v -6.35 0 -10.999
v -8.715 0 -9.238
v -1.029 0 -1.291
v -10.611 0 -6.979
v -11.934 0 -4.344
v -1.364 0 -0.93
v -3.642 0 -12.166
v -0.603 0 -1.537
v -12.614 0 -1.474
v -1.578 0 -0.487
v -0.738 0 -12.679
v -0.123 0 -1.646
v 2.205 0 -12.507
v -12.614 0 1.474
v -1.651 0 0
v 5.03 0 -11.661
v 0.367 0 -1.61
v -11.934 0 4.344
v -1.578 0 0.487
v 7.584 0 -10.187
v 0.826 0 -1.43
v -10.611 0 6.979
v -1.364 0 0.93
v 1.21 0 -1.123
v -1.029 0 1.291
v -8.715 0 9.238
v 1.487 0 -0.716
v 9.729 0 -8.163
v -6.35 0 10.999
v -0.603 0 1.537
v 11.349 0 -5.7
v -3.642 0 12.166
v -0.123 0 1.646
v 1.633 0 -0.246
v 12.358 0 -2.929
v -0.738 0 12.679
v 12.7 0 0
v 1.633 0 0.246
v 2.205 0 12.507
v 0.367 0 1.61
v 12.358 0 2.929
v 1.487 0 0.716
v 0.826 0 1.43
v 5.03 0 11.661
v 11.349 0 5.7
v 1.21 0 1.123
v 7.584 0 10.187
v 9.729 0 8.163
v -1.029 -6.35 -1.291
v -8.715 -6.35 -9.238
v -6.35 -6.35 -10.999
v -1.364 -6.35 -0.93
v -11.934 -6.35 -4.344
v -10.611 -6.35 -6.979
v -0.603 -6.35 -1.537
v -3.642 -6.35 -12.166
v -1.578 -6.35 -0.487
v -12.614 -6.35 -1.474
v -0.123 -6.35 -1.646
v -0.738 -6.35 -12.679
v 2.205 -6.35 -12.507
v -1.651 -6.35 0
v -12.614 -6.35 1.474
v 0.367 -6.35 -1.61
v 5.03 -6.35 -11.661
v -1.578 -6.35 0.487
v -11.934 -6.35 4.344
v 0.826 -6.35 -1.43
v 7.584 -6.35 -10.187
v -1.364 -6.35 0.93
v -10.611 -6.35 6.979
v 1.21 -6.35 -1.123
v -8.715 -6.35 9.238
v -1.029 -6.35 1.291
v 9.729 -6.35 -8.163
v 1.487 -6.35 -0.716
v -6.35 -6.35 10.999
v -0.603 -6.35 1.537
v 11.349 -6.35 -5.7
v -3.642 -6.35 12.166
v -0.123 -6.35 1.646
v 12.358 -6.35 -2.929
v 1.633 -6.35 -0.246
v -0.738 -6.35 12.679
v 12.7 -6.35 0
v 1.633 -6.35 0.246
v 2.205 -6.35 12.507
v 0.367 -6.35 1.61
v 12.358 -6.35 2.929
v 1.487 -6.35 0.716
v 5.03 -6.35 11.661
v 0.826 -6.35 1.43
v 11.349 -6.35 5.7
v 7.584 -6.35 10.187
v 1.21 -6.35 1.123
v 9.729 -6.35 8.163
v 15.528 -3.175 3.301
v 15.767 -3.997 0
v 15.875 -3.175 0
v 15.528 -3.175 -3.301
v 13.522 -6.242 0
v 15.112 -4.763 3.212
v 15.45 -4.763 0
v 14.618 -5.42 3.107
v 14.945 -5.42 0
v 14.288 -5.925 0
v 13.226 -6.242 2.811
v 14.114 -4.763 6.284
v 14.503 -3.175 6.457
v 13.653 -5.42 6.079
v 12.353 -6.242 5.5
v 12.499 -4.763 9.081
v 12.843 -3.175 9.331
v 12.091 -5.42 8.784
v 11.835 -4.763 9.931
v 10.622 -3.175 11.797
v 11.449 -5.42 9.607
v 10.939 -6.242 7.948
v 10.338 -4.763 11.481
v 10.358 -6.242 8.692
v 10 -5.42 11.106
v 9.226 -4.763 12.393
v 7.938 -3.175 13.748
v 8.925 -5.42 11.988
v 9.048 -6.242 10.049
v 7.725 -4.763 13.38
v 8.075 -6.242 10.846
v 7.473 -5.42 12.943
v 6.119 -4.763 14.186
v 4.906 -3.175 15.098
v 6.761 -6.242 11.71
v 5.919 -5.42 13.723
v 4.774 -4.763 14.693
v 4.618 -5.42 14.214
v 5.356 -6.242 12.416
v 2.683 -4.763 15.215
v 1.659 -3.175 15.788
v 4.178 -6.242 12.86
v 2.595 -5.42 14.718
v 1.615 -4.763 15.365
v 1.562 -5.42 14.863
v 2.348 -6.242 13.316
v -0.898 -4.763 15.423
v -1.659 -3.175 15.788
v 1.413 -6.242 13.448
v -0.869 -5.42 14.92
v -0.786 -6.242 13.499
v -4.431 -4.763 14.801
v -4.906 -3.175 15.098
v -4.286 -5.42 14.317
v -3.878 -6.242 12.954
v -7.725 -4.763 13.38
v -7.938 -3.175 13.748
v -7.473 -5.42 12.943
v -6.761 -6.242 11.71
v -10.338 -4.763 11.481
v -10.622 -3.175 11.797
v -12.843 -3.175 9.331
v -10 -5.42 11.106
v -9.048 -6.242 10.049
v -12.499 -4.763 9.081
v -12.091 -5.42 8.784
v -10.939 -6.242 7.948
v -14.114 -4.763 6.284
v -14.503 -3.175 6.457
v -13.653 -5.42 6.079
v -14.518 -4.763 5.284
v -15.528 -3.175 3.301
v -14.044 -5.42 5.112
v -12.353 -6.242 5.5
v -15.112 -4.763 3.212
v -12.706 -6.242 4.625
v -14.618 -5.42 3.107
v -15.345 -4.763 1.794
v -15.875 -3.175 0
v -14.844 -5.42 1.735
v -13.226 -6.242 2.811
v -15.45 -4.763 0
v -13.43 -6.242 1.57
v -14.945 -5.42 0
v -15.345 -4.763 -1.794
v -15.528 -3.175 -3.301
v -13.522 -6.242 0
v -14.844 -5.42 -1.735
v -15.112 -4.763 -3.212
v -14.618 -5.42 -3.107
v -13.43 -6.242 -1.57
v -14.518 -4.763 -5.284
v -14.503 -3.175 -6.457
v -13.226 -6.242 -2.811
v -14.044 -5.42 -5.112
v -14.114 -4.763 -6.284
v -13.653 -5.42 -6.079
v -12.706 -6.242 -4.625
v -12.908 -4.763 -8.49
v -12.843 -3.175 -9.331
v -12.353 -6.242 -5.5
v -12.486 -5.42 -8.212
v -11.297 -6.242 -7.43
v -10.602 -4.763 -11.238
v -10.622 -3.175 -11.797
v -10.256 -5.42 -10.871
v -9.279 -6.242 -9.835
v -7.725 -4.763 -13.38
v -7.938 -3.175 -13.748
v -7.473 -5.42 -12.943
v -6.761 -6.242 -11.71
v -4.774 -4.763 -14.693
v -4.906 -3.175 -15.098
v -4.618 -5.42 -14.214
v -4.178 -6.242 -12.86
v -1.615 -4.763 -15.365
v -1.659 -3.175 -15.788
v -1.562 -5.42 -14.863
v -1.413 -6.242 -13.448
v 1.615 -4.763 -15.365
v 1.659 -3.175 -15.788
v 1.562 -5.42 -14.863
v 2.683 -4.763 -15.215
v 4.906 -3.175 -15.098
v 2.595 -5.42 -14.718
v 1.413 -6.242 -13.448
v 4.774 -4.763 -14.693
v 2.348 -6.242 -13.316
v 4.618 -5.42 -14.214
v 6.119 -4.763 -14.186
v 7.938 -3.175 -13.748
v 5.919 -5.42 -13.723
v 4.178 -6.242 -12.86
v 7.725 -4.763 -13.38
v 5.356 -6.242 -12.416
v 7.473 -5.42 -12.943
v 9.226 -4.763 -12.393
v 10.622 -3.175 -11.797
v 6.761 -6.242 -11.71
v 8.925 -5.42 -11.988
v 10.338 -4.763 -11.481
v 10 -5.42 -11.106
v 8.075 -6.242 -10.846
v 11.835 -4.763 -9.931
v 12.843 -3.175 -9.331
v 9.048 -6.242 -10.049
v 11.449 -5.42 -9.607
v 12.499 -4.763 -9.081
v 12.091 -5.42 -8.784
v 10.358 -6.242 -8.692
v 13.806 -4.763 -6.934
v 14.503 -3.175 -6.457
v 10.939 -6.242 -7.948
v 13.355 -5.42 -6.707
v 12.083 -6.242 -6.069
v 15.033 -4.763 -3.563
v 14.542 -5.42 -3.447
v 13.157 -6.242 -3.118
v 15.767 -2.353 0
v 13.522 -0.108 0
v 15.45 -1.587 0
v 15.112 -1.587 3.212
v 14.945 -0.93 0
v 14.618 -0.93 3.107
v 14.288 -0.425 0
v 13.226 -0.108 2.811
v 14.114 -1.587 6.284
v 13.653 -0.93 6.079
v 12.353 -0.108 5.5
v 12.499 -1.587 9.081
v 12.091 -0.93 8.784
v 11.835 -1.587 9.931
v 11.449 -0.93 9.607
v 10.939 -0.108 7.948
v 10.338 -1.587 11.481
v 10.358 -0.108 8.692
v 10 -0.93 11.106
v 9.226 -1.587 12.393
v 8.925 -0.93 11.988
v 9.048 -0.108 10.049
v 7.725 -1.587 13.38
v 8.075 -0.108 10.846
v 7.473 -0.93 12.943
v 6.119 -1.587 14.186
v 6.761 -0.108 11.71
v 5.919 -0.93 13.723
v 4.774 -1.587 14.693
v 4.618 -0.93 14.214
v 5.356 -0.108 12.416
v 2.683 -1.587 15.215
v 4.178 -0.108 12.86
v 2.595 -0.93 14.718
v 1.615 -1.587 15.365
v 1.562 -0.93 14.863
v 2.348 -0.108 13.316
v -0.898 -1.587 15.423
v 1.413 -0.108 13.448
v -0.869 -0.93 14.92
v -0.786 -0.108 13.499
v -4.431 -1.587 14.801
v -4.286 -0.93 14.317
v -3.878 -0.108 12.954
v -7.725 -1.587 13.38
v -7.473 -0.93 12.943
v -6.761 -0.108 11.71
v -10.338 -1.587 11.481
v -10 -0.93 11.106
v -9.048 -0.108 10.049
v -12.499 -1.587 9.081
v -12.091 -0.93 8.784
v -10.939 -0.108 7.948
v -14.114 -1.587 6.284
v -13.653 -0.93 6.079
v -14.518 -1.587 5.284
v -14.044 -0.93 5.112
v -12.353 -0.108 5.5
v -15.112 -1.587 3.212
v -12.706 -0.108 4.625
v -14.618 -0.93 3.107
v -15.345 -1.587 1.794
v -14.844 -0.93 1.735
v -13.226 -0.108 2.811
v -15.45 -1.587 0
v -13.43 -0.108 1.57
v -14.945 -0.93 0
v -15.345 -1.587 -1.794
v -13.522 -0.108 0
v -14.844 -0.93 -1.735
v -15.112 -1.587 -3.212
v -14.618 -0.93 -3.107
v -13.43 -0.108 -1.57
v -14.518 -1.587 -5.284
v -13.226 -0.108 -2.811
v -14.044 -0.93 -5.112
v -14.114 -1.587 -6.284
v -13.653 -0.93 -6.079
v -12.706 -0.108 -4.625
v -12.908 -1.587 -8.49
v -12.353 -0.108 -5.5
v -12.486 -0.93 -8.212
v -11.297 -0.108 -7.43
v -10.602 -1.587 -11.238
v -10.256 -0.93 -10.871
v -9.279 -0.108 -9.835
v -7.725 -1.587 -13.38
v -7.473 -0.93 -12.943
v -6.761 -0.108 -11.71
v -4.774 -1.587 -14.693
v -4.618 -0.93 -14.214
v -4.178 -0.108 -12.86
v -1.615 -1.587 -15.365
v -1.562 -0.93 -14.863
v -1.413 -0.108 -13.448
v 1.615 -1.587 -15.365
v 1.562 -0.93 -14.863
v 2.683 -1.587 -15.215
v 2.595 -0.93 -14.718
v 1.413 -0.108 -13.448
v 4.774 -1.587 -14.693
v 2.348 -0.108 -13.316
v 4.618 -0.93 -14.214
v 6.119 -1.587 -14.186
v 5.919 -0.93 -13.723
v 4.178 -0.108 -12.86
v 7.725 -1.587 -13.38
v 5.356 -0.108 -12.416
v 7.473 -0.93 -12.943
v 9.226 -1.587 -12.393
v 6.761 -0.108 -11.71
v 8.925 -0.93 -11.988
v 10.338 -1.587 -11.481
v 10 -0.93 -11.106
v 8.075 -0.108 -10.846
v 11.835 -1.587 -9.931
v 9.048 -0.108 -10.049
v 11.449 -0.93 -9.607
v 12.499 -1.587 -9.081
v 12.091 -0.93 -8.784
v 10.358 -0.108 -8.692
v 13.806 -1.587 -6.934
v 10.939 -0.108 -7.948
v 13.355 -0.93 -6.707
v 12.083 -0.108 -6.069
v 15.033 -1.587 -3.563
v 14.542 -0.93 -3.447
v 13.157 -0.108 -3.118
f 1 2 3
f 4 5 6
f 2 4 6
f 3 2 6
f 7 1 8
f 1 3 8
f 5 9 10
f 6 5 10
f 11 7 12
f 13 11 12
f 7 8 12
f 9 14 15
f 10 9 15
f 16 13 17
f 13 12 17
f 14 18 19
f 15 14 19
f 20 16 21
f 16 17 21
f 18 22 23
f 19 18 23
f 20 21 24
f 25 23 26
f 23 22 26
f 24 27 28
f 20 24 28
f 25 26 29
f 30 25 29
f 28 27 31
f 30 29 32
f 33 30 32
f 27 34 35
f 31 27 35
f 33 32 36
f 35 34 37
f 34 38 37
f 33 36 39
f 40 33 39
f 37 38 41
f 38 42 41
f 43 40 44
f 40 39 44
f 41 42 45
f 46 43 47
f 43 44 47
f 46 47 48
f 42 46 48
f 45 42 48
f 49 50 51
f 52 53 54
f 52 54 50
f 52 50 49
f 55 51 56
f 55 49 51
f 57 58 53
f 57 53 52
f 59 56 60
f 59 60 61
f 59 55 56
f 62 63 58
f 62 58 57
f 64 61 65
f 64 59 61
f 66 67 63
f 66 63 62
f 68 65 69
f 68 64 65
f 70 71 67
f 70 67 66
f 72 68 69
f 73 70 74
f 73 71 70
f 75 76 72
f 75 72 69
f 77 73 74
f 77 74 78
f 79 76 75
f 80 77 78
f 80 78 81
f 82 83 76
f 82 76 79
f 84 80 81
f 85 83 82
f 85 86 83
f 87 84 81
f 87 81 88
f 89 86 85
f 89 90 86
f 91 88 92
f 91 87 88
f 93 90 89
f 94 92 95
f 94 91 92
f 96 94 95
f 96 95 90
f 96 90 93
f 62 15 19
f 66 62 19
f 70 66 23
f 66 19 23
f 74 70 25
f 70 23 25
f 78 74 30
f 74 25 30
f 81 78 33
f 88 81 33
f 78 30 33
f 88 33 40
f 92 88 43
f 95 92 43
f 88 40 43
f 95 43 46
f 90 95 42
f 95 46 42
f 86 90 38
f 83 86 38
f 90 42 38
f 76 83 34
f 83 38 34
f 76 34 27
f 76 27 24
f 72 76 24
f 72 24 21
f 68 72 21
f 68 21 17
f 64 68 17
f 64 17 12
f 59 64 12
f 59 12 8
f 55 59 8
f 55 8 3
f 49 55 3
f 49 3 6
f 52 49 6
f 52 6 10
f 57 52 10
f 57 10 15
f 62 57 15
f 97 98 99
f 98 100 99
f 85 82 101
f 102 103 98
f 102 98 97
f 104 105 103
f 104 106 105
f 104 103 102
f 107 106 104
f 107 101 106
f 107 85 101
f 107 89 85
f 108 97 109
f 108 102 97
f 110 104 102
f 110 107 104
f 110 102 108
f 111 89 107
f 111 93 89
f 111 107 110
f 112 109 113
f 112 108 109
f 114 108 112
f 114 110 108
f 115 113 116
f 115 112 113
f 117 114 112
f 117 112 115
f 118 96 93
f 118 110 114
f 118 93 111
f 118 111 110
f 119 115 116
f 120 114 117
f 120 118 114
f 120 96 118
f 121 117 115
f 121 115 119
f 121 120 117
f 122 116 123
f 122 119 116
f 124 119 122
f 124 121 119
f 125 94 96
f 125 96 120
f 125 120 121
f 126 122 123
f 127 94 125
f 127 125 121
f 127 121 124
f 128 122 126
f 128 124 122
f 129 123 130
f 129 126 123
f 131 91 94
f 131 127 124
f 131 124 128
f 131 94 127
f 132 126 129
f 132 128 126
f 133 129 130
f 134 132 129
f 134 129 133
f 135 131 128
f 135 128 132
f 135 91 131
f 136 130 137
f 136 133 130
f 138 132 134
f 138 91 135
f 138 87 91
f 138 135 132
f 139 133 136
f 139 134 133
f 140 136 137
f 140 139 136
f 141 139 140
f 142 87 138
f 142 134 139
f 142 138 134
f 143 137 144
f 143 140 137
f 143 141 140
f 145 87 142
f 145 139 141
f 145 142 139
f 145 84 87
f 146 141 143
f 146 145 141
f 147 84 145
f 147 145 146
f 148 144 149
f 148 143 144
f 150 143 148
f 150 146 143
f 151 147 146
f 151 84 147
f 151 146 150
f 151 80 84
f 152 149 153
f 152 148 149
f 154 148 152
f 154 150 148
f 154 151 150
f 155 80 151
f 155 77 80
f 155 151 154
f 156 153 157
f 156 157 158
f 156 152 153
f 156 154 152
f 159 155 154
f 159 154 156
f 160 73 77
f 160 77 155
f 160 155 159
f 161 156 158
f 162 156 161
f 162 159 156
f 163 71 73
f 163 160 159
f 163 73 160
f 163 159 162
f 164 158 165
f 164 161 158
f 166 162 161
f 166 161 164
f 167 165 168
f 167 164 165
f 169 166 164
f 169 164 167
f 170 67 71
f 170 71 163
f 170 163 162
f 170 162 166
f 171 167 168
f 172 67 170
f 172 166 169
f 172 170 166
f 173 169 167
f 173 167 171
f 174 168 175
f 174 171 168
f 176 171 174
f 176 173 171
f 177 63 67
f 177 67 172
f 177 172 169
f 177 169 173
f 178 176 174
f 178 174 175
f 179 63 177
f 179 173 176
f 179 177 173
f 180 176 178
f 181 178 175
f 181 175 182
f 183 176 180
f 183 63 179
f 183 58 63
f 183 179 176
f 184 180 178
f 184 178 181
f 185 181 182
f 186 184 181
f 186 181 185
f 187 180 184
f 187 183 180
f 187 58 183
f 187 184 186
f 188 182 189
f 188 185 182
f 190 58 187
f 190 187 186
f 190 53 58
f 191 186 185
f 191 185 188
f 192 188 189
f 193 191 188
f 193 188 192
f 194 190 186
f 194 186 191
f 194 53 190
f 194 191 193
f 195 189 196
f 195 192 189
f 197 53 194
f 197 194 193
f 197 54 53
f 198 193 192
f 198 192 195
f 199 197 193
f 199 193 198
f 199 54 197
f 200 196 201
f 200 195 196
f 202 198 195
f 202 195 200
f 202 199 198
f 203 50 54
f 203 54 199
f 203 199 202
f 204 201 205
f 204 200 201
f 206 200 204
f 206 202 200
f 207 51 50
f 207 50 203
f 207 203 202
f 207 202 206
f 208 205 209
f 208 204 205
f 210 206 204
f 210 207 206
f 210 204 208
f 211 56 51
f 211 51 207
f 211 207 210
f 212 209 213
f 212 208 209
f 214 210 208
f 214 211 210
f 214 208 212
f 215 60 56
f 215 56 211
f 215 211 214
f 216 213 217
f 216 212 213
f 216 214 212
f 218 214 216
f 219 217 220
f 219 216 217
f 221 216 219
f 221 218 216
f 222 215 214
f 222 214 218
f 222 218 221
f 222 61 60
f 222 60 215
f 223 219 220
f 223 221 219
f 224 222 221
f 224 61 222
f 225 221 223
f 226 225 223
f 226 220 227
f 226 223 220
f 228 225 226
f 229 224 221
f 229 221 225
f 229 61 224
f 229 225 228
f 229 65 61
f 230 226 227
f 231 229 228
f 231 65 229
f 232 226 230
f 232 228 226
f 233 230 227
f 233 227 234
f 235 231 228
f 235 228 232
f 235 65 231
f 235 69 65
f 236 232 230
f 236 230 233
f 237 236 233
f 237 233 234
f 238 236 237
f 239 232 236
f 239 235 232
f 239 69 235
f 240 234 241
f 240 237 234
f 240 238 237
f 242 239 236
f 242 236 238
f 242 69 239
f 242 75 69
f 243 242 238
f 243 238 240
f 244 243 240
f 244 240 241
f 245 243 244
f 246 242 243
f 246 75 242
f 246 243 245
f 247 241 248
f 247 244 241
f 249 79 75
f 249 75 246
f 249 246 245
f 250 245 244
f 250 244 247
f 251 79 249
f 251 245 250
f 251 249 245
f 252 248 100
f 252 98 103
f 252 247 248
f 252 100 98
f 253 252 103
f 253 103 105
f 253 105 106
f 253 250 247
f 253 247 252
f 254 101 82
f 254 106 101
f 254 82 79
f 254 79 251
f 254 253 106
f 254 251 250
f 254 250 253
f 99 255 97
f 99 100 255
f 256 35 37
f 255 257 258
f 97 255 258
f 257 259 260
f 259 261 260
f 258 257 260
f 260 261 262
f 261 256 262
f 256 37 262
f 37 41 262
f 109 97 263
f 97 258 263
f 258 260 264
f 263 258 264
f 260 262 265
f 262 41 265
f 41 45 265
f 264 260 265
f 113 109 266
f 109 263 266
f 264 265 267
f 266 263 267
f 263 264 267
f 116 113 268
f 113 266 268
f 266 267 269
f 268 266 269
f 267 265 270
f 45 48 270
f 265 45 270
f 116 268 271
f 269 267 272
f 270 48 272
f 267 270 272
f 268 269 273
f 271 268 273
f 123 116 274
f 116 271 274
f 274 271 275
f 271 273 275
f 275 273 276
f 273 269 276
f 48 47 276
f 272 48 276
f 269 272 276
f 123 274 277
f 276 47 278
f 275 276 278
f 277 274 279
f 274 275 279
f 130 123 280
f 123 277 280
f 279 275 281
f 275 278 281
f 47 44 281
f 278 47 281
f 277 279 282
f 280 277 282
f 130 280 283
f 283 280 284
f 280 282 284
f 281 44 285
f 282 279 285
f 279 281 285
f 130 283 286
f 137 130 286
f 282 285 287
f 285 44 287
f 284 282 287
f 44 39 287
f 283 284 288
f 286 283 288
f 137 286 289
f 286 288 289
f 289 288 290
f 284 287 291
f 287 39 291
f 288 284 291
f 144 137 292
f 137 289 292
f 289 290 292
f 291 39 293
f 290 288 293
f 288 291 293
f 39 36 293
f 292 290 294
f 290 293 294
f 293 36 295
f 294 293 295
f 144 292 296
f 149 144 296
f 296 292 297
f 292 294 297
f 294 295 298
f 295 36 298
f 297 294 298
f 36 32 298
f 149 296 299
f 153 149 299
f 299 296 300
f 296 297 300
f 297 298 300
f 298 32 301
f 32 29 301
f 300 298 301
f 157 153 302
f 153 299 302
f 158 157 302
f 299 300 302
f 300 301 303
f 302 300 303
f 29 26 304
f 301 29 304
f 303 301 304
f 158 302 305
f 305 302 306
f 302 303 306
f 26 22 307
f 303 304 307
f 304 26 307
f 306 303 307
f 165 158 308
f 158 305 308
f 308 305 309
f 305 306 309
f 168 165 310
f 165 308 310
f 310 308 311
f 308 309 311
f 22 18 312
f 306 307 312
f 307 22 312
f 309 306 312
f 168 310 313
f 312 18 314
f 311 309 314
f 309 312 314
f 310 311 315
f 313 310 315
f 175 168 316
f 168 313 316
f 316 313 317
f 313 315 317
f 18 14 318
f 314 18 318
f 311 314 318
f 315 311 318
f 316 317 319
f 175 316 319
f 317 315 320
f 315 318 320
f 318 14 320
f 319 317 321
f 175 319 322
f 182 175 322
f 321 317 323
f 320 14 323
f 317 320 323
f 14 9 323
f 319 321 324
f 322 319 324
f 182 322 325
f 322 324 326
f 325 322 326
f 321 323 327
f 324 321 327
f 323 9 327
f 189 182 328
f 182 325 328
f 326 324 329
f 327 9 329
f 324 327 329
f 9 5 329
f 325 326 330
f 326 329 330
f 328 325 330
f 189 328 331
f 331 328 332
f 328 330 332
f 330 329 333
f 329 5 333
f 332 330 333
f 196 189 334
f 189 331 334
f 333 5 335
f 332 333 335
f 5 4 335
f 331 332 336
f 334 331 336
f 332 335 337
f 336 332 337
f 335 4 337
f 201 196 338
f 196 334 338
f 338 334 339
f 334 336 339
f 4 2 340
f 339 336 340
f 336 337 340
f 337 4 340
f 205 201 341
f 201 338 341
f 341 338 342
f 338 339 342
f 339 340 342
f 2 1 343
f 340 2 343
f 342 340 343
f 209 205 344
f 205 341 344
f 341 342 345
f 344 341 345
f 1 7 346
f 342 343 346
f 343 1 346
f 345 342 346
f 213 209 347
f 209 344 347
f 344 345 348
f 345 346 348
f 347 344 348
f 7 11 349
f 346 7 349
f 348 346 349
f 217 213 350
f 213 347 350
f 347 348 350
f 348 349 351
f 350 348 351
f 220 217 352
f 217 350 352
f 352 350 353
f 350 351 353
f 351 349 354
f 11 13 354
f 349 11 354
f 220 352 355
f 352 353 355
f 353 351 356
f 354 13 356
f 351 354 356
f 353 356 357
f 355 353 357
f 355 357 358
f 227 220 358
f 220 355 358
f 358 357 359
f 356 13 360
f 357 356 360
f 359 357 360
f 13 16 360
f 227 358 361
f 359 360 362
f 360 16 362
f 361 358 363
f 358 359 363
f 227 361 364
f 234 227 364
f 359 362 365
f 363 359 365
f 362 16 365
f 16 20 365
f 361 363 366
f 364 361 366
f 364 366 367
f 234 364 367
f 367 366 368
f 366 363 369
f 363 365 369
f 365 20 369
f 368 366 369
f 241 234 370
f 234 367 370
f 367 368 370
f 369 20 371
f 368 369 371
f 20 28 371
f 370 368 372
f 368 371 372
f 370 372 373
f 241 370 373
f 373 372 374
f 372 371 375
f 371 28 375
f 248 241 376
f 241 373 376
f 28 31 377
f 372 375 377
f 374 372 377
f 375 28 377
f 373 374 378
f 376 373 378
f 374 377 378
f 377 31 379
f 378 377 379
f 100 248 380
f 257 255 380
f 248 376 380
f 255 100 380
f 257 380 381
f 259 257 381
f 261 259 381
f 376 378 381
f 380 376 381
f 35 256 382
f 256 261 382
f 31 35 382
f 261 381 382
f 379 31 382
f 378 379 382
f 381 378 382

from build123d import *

# Parameters (mm, degrees)
F0_R     = 15.875
F1_DEPTH = 6.35
F3_D     = 3.302
F4_R     = 3.17499


# Not quite as in the source:
# - a fillet or chamfer is up to 0.001 mm smaller than in the source, because OpenCascade refuses the exact size


with BuildPart() as f1:
    # F0 (on Front) → F1 (new body)
    with BuildSketch(Plane.XZ):
        Circle(F0_R)
    extrude(amount=F1_DEPTH)

    # F3 (through all)
    with Locations(Plane.XZ.offset(6.35)):
        with Locations((0, 0)):
            Hole(F3_D / 2)

    # F4 (radius 3.175 in the source; OpenCascade refuses exactly that, so slightly less here)
    f4_edges = [f1.edges().sort_by_distance(p)[0] for p in [
        (-15.875, -6.35, 0),
        (-15.875, 0, 0),
    ]]
    fillet(f4_edges, radius=F4_R)


solid = f1.part
